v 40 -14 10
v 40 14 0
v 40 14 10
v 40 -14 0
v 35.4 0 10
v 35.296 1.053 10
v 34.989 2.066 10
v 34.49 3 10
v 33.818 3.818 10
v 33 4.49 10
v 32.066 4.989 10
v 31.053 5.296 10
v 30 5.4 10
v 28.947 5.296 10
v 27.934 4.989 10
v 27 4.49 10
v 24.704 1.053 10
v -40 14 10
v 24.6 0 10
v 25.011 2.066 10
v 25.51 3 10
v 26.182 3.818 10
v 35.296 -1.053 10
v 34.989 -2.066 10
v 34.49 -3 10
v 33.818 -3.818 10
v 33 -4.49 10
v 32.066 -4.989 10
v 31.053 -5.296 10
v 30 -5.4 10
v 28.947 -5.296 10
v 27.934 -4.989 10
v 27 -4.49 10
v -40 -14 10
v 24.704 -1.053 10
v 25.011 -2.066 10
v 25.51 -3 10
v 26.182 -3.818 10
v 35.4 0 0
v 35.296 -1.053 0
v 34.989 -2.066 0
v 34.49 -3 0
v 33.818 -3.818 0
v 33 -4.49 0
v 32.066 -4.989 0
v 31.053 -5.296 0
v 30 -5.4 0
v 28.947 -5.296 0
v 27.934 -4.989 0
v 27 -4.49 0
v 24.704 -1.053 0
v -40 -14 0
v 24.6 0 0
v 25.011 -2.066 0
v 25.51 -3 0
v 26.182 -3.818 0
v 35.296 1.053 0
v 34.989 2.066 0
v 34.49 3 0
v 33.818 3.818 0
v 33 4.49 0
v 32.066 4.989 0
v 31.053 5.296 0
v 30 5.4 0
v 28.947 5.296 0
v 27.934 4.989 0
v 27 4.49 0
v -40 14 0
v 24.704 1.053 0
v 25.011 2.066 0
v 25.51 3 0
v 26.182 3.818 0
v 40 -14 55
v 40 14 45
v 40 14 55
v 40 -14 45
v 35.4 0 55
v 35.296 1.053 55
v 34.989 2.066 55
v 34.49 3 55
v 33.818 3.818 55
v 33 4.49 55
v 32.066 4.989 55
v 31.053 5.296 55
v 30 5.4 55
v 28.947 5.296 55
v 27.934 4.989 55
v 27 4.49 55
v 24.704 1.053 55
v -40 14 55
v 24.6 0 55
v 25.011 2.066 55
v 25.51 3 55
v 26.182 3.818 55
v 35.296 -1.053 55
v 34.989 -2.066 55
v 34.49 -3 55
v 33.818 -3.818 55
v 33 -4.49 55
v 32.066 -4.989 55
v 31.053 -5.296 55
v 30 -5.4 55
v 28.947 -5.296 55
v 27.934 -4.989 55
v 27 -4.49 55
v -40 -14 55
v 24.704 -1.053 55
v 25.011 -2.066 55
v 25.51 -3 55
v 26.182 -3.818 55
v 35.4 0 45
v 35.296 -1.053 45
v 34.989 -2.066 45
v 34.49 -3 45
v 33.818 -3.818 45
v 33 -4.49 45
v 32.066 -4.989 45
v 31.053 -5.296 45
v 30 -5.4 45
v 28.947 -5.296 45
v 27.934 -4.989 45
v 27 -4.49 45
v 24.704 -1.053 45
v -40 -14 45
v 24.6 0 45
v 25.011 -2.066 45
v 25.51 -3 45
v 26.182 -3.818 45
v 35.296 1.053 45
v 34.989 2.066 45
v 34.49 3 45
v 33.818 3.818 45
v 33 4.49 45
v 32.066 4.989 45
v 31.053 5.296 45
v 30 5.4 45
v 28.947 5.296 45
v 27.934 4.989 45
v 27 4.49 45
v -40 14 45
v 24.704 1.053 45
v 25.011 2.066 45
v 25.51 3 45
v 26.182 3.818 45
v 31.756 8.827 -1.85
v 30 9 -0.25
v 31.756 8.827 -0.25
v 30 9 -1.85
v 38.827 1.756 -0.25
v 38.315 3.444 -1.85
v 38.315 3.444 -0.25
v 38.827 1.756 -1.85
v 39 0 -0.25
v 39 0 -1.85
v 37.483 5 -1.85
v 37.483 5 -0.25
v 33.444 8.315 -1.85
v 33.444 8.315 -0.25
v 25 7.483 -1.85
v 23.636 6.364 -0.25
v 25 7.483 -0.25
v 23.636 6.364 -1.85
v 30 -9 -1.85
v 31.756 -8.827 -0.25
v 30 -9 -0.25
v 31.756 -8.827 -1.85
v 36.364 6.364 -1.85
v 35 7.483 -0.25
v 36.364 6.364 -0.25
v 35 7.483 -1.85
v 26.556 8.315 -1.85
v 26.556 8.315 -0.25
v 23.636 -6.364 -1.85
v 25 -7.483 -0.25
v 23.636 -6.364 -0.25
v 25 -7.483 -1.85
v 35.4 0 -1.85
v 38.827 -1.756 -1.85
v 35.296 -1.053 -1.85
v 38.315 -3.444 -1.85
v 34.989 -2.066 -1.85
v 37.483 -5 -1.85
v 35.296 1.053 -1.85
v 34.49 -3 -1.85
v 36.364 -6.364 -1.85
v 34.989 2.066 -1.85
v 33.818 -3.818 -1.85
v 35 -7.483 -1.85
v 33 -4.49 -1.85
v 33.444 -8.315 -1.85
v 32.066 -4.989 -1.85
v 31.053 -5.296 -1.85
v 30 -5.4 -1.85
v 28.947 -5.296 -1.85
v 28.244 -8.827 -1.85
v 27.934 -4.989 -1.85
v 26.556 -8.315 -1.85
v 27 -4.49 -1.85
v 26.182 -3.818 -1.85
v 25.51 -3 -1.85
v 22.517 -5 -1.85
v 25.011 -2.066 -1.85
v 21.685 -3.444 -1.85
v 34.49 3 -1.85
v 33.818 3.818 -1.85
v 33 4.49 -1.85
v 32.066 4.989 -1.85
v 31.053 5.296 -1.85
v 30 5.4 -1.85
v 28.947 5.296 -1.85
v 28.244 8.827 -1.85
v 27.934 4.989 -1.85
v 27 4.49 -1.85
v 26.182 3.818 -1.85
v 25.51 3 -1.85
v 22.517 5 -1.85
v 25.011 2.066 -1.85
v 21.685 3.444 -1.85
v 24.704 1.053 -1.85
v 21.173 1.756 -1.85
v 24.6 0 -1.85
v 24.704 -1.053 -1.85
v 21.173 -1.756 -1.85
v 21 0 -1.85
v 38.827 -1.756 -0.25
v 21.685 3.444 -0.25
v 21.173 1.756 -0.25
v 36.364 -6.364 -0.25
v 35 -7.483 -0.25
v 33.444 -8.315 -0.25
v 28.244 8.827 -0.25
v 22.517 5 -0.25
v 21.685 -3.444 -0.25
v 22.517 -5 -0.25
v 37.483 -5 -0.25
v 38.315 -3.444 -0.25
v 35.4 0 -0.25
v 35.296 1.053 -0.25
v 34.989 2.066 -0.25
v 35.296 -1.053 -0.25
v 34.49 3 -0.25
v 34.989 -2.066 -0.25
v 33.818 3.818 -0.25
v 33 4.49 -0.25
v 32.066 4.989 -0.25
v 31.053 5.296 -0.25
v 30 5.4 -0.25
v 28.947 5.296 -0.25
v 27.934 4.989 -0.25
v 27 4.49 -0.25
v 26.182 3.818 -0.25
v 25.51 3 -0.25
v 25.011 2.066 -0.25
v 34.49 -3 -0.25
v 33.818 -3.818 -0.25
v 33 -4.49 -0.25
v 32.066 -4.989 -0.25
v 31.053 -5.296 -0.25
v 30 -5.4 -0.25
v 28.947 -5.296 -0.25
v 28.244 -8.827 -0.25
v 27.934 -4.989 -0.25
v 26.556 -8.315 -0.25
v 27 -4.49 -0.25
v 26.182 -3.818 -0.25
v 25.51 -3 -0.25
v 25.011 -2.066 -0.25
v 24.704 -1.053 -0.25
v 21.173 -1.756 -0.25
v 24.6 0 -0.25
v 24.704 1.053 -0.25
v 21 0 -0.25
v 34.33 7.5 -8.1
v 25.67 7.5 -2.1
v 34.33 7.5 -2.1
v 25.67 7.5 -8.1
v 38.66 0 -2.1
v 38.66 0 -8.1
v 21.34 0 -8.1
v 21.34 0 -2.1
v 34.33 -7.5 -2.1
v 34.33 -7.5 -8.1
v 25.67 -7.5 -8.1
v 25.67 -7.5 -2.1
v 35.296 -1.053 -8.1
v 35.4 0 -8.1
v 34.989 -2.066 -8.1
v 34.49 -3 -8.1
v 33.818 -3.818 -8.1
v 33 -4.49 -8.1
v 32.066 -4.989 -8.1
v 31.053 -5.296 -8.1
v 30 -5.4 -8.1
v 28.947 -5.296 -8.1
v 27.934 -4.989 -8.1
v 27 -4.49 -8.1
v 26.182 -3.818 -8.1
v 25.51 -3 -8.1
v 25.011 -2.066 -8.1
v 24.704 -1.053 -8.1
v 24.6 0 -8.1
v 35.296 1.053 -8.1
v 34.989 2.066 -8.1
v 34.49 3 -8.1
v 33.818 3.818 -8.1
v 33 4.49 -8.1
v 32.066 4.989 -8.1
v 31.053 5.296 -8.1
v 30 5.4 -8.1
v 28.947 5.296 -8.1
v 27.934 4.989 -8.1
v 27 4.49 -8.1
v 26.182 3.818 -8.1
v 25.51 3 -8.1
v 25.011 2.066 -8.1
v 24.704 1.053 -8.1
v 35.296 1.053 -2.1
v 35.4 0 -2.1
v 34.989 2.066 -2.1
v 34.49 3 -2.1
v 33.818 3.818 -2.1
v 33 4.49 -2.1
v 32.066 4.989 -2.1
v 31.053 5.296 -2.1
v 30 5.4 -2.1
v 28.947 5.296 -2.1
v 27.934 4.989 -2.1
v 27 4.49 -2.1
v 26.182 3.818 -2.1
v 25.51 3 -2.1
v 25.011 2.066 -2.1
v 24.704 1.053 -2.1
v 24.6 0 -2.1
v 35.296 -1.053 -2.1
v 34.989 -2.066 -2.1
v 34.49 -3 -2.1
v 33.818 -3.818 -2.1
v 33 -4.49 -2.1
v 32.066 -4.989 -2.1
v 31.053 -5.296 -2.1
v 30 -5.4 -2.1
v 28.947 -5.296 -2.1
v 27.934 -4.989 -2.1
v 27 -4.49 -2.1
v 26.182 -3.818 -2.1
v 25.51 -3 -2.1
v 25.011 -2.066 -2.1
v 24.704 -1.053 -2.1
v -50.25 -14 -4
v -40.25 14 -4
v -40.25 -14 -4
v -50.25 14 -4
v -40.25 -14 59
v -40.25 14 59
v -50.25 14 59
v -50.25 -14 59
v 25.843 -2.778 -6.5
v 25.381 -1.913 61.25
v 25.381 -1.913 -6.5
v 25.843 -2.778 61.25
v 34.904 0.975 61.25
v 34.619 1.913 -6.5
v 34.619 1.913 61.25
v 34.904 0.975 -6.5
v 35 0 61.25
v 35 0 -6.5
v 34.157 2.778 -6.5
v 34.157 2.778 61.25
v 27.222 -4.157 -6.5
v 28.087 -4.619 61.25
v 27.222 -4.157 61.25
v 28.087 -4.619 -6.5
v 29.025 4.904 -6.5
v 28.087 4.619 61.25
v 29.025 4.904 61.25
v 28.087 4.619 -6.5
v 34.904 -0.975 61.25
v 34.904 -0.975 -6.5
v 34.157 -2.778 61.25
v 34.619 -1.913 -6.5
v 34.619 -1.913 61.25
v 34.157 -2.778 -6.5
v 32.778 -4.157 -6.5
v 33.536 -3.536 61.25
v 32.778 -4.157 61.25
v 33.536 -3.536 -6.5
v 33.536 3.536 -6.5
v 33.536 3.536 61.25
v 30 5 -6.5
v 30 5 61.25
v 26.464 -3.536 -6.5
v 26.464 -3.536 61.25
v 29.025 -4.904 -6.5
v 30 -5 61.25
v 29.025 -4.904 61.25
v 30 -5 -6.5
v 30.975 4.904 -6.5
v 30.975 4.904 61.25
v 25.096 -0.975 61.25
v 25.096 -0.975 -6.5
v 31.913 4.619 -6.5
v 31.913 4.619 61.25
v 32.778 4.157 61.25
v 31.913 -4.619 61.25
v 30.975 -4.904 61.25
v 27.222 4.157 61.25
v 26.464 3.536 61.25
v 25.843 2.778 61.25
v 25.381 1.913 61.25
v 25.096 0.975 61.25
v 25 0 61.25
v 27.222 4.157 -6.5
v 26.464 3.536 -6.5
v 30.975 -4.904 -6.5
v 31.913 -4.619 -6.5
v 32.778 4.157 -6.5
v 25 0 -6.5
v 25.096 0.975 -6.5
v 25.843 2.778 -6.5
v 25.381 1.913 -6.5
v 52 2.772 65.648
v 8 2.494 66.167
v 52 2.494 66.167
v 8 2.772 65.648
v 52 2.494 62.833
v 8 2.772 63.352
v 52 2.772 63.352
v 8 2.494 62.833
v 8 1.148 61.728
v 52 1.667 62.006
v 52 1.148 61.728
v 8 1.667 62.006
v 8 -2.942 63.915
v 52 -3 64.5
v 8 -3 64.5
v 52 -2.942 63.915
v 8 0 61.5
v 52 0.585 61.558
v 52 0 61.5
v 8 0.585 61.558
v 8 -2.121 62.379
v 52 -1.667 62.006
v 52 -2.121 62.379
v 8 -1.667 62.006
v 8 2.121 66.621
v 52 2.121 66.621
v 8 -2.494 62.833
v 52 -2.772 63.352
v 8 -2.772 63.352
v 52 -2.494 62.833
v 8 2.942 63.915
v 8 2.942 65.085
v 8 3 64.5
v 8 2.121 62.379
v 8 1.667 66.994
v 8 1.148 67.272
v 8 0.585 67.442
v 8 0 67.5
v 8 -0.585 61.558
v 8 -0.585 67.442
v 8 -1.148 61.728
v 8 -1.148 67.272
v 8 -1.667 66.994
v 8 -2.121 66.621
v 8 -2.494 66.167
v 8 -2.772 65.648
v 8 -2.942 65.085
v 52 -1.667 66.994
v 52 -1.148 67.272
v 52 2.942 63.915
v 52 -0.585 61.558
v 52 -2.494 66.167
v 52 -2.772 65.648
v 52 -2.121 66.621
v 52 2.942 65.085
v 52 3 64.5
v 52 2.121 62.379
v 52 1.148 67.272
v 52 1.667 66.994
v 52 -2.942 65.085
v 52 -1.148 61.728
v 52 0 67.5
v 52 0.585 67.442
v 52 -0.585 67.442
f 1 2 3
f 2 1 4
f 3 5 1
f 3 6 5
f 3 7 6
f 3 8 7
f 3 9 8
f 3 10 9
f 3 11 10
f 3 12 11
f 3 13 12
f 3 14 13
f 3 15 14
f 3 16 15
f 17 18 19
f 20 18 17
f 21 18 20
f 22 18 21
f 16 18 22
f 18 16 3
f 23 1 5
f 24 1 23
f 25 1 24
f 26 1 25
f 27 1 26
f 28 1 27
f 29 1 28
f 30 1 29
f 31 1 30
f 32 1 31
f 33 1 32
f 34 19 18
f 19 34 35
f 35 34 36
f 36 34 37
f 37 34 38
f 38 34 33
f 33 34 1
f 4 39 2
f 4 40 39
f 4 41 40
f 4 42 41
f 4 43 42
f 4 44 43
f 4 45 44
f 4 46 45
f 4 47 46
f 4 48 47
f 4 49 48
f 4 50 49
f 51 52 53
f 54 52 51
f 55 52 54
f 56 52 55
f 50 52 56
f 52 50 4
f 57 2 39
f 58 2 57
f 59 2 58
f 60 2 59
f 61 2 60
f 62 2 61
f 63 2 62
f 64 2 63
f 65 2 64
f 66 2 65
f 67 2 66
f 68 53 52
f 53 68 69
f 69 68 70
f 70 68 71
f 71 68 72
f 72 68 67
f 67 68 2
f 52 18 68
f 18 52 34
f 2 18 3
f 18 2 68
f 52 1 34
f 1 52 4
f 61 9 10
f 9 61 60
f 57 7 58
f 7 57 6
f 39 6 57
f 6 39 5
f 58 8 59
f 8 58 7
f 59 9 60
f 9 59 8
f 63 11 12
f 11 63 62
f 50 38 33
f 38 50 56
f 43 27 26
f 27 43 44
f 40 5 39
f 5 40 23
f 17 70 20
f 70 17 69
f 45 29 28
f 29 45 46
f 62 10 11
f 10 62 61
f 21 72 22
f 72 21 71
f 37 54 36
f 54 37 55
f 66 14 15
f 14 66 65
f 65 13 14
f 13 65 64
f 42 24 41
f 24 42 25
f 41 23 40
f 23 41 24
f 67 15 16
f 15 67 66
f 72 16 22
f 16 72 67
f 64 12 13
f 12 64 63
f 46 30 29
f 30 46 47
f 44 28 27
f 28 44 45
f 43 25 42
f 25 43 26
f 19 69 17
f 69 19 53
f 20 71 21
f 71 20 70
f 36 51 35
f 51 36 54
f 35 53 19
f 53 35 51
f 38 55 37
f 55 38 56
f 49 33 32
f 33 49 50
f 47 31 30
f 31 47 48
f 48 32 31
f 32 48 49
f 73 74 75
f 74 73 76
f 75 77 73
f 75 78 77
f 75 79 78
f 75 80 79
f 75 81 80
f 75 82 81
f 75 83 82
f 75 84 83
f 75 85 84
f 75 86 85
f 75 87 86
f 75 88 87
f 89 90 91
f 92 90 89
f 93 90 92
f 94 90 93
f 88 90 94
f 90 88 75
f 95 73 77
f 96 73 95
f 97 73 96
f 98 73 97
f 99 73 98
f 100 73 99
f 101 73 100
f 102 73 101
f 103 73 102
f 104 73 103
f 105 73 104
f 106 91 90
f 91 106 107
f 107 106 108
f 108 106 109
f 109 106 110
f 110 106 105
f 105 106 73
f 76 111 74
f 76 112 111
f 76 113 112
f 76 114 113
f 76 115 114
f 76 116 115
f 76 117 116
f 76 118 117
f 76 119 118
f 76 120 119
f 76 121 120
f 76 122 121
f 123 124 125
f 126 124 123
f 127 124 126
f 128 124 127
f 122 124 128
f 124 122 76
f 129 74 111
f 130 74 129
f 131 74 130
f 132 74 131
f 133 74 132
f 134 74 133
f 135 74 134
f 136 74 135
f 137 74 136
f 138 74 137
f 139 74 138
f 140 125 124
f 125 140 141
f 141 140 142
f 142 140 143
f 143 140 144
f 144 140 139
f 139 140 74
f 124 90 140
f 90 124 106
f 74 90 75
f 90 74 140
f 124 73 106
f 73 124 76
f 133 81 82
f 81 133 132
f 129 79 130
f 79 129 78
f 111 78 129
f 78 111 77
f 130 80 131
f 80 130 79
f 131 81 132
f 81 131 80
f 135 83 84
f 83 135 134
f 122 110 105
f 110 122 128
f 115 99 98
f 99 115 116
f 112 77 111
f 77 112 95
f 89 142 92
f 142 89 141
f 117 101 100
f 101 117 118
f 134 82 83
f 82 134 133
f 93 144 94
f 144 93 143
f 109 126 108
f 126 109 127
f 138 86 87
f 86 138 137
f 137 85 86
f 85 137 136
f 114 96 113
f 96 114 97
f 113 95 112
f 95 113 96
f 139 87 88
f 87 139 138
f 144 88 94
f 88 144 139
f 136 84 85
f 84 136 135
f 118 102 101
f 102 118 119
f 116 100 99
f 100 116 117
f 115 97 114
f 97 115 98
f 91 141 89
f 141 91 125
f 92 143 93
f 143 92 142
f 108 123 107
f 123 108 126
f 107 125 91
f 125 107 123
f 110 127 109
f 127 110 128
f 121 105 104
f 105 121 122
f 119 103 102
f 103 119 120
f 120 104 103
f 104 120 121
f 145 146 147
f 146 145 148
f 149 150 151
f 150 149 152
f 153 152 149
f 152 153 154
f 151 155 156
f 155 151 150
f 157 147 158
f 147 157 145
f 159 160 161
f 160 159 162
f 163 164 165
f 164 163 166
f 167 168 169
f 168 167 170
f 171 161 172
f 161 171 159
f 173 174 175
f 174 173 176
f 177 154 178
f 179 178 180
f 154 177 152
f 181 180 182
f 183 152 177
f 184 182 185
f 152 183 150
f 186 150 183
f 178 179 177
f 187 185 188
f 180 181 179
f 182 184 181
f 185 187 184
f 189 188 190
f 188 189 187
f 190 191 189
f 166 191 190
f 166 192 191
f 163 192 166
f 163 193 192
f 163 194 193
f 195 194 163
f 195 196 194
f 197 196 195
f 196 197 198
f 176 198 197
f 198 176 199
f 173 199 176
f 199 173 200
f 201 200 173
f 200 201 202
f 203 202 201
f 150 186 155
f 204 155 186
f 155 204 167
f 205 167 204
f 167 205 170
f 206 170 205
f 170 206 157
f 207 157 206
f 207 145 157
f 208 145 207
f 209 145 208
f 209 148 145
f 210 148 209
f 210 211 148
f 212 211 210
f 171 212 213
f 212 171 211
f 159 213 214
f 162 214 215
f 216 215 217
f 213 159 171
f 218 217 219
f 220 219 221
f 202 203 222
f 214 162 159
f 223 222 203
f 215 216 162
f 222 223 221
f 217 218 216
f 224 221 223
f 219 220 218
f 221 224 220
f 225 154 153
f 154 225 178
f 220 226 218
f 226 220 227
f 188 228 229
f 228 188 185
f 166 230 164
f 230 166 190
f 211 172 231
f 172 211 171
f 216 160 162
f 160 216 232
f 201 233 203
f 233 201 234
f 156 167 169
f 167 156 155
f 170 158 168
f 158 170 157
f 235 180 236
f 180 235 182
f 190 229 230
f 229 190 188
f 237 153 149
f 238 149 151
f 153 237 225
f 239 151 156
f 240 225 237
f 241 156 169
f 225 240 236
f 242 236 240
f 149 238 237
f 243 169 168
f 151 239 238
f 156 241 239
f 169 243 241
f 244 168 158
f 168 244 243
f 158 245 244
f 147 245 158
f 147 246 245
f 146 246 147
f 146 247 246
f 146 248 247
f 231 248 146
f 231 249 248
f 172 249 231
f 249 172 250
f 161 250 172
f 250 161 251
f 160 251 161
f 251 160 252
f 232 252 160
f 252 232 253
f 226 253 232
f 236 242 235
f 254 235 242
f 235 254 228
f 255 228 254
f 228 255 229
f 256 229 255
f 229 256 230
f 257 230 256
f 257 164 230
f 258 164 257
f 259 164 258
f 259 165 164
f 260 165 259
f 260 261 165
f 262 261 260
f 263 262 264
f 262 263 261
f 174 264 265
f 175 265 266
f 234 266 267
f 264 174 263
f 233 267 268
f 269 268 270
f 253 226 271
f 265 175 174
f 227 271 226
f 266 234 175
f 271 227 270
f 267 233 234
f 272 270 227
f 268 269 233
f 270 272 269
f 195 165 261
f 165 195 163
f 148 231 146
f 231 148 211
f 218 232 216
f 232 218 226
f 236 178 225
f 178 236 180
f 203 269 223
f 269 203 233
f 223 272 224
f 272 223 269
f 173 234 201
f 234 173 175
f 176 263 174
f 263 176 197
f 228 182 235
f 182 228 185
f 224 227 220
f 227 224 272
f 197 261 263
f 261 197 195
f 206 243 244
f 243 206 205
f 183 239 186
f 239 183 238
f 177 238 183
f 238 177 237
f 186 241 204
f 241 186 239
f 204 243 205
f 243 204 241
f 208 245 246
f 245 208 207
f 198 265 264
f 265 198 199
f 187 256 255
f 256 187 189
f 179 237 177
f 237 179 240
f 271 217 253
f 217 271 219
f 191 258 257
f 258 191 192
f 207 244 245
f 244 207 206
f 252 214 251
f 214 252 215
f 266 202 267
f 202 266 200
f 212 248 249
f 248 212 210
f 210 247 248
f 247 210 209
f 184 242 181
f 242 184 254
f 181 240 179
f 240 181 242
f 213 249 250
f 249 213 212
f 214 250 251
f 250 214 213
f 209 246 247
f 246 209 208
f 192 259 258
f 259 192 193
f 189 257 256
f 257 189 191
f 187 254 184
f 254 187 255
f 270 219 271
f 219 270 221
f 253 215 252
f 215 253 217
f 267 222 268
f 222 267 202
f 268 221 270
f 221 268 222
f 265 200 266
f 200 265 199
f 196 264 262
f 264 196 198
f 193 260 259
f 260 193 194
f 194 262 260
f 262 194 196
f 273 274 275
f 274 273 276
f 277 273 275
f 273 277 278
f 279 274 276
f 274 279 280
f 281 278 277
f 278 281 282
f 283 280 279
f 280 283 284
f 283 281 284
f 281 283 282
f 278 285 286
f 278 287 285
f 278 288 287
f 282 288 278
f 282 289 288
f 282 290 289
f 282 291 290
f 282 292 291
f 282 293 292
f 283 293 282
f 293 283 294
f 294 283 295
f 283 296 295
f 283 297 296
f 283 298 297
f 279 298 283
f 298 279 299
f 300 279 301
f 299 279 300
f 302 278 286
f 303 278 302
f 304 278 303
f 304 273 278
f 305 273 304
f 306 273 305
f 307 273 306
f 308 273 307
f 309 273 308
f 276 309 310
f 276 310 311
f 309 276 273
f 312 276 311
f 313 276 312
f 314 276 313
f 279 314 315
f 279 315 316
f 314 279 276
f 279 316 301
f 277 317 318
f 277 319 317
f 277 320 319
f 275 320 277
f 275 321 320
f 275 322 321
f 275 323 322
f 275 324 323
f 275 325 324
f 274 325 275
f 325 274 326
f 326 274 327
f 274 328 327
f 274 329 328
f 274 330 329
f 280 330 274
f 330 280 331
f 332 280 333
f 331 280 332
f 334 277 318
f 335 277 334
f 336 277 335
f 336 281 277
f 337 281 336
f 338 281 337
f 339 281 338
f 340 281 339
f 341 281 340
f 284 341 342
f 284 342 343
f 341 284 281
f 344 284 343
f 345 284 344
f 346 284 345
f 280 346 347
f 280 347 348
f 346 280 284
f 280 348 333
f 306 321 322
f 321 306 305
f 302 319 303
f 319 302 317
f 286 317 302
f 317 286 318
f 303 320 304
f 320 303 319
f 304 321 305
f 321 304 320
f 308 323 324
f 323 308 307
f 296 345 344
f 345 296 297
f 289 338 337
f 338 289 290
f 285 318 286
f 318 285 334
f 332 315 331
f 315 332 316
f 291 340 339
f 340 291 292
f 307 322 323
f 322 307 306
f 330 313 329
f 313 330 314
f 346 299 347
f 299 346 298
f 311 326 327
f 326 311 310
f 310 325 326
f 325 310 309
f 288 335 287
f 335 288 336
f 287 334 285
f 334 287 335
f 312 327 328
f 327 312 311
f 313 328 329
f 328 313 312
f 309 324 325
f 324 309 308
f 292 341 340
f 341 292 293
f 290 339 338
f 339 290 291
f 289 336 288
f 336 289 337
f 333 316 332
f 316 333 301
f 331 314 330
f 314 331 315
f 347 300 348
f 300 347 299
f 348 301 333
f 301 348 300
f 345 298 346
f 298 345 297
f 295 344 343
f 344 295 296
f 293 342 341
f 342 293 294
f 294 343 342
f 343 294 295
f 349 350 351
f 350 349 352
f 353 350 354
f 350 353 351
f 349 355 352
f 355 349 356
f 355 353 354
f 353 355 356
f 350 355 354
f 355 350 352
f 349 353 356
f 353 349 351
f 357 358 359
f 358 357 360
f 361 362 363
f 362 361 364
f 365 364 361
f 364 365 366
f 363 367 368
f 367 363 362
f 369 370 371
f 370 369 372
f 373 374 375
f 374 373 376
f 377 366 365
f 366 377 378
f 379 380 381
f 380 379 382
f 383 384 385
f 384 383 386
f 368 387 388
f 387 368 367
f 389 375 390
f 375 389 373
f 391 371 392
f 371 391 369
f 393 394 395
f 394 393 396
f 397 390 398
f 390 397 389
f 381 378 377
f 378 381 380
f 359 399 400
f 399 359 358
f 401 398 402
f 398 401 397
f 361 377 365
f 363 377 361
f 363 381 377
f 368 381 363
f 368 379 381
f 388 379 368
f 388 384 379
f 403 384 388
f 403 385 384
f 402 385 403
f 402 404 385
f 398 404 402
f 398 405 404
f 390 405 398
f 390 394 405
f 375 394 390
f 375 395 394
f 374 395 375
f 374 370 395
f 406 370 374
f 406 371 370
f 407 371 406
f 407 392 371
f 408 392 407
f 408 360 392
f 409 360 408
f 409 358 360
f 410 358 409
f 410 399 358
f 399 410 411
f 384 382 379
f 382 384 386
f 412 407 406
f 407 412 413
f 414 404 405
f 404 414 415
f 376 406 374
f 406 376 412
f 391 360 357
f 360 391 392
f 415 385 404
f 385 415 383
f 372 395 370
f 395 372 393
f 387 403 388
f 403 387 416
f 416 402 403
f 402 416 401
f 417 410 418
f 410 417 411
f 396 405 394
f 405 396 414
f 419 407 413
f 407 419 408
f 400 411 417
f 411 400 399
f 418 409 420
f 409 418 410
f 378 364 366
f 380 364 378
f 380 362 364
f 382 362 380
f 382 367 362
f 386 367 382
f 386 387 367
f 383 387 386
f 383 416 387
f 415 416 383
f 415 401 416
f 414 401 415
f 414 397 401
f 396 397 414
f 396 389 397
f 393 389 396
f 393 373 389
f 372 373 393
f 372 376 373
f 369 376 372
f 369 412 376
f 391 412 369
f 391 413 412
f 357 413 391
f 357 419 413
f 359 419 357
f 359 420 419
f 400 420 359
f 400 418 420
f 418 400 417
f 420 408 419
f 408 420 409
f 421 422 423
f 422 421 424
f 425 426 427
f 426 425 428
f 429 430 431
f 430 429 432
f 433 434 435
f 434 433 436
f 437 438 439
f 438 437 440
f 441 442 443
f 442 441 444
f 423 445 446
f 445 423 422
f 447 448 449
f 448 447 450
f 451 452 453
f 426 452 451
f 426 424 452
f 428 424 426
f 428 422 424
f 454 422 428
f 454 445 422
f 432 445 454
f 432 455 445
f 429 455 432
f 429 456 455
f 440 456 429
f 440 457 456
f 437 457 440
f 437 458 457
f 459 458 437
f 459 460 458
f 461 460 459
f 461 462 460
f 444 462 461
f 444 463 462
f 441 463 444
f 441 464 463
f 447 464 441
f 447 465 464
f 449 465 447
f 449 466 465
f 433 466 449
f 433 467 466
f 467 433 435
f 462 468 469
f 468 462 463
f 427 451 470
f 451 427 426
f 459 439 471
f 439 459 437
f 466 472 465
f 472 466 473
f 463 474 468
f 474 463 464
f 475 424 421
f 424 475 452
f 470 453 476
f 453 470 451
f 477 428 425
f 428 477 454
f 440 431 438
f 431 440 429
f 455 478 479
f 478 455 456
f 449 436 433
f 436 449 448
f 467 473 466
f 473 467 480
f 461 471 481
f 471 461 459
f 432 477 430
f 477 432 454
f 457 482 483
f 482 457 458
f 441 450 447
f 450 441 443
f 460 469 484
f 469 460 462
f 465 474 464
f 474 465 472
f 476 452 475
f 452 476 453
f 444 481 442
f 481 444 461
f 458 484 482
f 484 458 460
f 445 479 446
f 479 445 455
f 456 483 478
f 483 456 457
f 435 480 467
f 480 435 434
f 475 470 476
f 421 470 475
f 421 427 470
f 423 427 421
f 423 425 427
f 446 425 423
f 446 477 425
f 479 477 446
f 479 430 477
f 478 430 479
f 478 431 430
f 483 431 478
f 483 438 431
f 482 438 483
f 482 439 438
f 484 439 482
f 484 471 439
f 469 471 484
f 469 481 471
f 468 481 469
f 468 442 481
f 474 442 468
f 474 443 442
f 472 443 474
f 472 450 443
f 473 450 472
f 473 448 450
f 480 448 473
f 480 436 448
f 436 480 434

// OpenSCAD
$fn = 32;

// ------------------------------------------------------------------------
// C clamp: throat 45 mm, screw d10
// Every part is its own module, assembly() places every instance.
// ------------------------------------------------------------------------

// --- part 1 ---
module clamp_arm() {
  difference() {
    translate([-40, -14, 0]) cube([80, 28, 10]);
    translate([30, 0, -1]) cylinder(h = 12, d = 10.8);
  }
}

// --- part 2 ---
module clamp_spine() {
  difference() {
    translate([-31.5, -14, 0]) cube([63, 28, 10]);
  }
}

// --- part 3 ---
module clamp_screw() {
  translate([0, 0, -33.875]) cylinder(h = 67.75, d = 10);
}

// --- part 4 ---
module clamp_washer() {
  difference() {
      translate([0, 0, 0]) cylinder(h = 1.6, d = 18);
      translate([0, 0, -1]) cylinder(h = 3.6, d = 10.8);
    }
}

// --- part 5 ---
module clamp_nut() {
  difference() {
    linear_extrude(height = 6) polygon(points = [[8.66, 0], [4.33, 7.5], [-4.33, 7.5], [-8.66, 0], [-4.33, -7.5], [4.33, -7.5]]);
    translate([0, 0, -1]) cylinder(h = 8, d = 10.8);
  }
}

// --- part 6 ---
module tommy_bar() {
  translate([0, 0, -22]) cylinder(h = 44, d = 6);
}

// --- assembly ---
module assembly() {
  color([0.80, 0.24, 0.20]) translate([0, 0, 0]) rotate([0, 0, 0]) clamp_arm();
  color([0.20, 0.45, 0.75]) translate([0, 0, 45]) rotate([0, 0, 0]) clamp_arm();
  color([0.25, 0.62, 0.32]) translate([-50.25, 0, 27.5]) rotate([0, 90, 0]) clamp_spine();
  color([0.92, 0.70, 0.18]) translate([30, 0, 27.375]) rotate([0, 0, 0]) clamp_screw();
  color([0.58, 0.35, 0.70]) translate([30, 0, -1.85]) rotate([0, 0, 0]) clamp_washer();
  color([0.16, 0.66, 0.66]) translate([30, 0, -8.1]) rotate([0, 0, 0]) clamp_nut();
  color([0.85, 0.48, 0.18]) translate([30, 0, 64.5]) rotate([0, 90, 0]) tommy_bar();
}

assembly();
